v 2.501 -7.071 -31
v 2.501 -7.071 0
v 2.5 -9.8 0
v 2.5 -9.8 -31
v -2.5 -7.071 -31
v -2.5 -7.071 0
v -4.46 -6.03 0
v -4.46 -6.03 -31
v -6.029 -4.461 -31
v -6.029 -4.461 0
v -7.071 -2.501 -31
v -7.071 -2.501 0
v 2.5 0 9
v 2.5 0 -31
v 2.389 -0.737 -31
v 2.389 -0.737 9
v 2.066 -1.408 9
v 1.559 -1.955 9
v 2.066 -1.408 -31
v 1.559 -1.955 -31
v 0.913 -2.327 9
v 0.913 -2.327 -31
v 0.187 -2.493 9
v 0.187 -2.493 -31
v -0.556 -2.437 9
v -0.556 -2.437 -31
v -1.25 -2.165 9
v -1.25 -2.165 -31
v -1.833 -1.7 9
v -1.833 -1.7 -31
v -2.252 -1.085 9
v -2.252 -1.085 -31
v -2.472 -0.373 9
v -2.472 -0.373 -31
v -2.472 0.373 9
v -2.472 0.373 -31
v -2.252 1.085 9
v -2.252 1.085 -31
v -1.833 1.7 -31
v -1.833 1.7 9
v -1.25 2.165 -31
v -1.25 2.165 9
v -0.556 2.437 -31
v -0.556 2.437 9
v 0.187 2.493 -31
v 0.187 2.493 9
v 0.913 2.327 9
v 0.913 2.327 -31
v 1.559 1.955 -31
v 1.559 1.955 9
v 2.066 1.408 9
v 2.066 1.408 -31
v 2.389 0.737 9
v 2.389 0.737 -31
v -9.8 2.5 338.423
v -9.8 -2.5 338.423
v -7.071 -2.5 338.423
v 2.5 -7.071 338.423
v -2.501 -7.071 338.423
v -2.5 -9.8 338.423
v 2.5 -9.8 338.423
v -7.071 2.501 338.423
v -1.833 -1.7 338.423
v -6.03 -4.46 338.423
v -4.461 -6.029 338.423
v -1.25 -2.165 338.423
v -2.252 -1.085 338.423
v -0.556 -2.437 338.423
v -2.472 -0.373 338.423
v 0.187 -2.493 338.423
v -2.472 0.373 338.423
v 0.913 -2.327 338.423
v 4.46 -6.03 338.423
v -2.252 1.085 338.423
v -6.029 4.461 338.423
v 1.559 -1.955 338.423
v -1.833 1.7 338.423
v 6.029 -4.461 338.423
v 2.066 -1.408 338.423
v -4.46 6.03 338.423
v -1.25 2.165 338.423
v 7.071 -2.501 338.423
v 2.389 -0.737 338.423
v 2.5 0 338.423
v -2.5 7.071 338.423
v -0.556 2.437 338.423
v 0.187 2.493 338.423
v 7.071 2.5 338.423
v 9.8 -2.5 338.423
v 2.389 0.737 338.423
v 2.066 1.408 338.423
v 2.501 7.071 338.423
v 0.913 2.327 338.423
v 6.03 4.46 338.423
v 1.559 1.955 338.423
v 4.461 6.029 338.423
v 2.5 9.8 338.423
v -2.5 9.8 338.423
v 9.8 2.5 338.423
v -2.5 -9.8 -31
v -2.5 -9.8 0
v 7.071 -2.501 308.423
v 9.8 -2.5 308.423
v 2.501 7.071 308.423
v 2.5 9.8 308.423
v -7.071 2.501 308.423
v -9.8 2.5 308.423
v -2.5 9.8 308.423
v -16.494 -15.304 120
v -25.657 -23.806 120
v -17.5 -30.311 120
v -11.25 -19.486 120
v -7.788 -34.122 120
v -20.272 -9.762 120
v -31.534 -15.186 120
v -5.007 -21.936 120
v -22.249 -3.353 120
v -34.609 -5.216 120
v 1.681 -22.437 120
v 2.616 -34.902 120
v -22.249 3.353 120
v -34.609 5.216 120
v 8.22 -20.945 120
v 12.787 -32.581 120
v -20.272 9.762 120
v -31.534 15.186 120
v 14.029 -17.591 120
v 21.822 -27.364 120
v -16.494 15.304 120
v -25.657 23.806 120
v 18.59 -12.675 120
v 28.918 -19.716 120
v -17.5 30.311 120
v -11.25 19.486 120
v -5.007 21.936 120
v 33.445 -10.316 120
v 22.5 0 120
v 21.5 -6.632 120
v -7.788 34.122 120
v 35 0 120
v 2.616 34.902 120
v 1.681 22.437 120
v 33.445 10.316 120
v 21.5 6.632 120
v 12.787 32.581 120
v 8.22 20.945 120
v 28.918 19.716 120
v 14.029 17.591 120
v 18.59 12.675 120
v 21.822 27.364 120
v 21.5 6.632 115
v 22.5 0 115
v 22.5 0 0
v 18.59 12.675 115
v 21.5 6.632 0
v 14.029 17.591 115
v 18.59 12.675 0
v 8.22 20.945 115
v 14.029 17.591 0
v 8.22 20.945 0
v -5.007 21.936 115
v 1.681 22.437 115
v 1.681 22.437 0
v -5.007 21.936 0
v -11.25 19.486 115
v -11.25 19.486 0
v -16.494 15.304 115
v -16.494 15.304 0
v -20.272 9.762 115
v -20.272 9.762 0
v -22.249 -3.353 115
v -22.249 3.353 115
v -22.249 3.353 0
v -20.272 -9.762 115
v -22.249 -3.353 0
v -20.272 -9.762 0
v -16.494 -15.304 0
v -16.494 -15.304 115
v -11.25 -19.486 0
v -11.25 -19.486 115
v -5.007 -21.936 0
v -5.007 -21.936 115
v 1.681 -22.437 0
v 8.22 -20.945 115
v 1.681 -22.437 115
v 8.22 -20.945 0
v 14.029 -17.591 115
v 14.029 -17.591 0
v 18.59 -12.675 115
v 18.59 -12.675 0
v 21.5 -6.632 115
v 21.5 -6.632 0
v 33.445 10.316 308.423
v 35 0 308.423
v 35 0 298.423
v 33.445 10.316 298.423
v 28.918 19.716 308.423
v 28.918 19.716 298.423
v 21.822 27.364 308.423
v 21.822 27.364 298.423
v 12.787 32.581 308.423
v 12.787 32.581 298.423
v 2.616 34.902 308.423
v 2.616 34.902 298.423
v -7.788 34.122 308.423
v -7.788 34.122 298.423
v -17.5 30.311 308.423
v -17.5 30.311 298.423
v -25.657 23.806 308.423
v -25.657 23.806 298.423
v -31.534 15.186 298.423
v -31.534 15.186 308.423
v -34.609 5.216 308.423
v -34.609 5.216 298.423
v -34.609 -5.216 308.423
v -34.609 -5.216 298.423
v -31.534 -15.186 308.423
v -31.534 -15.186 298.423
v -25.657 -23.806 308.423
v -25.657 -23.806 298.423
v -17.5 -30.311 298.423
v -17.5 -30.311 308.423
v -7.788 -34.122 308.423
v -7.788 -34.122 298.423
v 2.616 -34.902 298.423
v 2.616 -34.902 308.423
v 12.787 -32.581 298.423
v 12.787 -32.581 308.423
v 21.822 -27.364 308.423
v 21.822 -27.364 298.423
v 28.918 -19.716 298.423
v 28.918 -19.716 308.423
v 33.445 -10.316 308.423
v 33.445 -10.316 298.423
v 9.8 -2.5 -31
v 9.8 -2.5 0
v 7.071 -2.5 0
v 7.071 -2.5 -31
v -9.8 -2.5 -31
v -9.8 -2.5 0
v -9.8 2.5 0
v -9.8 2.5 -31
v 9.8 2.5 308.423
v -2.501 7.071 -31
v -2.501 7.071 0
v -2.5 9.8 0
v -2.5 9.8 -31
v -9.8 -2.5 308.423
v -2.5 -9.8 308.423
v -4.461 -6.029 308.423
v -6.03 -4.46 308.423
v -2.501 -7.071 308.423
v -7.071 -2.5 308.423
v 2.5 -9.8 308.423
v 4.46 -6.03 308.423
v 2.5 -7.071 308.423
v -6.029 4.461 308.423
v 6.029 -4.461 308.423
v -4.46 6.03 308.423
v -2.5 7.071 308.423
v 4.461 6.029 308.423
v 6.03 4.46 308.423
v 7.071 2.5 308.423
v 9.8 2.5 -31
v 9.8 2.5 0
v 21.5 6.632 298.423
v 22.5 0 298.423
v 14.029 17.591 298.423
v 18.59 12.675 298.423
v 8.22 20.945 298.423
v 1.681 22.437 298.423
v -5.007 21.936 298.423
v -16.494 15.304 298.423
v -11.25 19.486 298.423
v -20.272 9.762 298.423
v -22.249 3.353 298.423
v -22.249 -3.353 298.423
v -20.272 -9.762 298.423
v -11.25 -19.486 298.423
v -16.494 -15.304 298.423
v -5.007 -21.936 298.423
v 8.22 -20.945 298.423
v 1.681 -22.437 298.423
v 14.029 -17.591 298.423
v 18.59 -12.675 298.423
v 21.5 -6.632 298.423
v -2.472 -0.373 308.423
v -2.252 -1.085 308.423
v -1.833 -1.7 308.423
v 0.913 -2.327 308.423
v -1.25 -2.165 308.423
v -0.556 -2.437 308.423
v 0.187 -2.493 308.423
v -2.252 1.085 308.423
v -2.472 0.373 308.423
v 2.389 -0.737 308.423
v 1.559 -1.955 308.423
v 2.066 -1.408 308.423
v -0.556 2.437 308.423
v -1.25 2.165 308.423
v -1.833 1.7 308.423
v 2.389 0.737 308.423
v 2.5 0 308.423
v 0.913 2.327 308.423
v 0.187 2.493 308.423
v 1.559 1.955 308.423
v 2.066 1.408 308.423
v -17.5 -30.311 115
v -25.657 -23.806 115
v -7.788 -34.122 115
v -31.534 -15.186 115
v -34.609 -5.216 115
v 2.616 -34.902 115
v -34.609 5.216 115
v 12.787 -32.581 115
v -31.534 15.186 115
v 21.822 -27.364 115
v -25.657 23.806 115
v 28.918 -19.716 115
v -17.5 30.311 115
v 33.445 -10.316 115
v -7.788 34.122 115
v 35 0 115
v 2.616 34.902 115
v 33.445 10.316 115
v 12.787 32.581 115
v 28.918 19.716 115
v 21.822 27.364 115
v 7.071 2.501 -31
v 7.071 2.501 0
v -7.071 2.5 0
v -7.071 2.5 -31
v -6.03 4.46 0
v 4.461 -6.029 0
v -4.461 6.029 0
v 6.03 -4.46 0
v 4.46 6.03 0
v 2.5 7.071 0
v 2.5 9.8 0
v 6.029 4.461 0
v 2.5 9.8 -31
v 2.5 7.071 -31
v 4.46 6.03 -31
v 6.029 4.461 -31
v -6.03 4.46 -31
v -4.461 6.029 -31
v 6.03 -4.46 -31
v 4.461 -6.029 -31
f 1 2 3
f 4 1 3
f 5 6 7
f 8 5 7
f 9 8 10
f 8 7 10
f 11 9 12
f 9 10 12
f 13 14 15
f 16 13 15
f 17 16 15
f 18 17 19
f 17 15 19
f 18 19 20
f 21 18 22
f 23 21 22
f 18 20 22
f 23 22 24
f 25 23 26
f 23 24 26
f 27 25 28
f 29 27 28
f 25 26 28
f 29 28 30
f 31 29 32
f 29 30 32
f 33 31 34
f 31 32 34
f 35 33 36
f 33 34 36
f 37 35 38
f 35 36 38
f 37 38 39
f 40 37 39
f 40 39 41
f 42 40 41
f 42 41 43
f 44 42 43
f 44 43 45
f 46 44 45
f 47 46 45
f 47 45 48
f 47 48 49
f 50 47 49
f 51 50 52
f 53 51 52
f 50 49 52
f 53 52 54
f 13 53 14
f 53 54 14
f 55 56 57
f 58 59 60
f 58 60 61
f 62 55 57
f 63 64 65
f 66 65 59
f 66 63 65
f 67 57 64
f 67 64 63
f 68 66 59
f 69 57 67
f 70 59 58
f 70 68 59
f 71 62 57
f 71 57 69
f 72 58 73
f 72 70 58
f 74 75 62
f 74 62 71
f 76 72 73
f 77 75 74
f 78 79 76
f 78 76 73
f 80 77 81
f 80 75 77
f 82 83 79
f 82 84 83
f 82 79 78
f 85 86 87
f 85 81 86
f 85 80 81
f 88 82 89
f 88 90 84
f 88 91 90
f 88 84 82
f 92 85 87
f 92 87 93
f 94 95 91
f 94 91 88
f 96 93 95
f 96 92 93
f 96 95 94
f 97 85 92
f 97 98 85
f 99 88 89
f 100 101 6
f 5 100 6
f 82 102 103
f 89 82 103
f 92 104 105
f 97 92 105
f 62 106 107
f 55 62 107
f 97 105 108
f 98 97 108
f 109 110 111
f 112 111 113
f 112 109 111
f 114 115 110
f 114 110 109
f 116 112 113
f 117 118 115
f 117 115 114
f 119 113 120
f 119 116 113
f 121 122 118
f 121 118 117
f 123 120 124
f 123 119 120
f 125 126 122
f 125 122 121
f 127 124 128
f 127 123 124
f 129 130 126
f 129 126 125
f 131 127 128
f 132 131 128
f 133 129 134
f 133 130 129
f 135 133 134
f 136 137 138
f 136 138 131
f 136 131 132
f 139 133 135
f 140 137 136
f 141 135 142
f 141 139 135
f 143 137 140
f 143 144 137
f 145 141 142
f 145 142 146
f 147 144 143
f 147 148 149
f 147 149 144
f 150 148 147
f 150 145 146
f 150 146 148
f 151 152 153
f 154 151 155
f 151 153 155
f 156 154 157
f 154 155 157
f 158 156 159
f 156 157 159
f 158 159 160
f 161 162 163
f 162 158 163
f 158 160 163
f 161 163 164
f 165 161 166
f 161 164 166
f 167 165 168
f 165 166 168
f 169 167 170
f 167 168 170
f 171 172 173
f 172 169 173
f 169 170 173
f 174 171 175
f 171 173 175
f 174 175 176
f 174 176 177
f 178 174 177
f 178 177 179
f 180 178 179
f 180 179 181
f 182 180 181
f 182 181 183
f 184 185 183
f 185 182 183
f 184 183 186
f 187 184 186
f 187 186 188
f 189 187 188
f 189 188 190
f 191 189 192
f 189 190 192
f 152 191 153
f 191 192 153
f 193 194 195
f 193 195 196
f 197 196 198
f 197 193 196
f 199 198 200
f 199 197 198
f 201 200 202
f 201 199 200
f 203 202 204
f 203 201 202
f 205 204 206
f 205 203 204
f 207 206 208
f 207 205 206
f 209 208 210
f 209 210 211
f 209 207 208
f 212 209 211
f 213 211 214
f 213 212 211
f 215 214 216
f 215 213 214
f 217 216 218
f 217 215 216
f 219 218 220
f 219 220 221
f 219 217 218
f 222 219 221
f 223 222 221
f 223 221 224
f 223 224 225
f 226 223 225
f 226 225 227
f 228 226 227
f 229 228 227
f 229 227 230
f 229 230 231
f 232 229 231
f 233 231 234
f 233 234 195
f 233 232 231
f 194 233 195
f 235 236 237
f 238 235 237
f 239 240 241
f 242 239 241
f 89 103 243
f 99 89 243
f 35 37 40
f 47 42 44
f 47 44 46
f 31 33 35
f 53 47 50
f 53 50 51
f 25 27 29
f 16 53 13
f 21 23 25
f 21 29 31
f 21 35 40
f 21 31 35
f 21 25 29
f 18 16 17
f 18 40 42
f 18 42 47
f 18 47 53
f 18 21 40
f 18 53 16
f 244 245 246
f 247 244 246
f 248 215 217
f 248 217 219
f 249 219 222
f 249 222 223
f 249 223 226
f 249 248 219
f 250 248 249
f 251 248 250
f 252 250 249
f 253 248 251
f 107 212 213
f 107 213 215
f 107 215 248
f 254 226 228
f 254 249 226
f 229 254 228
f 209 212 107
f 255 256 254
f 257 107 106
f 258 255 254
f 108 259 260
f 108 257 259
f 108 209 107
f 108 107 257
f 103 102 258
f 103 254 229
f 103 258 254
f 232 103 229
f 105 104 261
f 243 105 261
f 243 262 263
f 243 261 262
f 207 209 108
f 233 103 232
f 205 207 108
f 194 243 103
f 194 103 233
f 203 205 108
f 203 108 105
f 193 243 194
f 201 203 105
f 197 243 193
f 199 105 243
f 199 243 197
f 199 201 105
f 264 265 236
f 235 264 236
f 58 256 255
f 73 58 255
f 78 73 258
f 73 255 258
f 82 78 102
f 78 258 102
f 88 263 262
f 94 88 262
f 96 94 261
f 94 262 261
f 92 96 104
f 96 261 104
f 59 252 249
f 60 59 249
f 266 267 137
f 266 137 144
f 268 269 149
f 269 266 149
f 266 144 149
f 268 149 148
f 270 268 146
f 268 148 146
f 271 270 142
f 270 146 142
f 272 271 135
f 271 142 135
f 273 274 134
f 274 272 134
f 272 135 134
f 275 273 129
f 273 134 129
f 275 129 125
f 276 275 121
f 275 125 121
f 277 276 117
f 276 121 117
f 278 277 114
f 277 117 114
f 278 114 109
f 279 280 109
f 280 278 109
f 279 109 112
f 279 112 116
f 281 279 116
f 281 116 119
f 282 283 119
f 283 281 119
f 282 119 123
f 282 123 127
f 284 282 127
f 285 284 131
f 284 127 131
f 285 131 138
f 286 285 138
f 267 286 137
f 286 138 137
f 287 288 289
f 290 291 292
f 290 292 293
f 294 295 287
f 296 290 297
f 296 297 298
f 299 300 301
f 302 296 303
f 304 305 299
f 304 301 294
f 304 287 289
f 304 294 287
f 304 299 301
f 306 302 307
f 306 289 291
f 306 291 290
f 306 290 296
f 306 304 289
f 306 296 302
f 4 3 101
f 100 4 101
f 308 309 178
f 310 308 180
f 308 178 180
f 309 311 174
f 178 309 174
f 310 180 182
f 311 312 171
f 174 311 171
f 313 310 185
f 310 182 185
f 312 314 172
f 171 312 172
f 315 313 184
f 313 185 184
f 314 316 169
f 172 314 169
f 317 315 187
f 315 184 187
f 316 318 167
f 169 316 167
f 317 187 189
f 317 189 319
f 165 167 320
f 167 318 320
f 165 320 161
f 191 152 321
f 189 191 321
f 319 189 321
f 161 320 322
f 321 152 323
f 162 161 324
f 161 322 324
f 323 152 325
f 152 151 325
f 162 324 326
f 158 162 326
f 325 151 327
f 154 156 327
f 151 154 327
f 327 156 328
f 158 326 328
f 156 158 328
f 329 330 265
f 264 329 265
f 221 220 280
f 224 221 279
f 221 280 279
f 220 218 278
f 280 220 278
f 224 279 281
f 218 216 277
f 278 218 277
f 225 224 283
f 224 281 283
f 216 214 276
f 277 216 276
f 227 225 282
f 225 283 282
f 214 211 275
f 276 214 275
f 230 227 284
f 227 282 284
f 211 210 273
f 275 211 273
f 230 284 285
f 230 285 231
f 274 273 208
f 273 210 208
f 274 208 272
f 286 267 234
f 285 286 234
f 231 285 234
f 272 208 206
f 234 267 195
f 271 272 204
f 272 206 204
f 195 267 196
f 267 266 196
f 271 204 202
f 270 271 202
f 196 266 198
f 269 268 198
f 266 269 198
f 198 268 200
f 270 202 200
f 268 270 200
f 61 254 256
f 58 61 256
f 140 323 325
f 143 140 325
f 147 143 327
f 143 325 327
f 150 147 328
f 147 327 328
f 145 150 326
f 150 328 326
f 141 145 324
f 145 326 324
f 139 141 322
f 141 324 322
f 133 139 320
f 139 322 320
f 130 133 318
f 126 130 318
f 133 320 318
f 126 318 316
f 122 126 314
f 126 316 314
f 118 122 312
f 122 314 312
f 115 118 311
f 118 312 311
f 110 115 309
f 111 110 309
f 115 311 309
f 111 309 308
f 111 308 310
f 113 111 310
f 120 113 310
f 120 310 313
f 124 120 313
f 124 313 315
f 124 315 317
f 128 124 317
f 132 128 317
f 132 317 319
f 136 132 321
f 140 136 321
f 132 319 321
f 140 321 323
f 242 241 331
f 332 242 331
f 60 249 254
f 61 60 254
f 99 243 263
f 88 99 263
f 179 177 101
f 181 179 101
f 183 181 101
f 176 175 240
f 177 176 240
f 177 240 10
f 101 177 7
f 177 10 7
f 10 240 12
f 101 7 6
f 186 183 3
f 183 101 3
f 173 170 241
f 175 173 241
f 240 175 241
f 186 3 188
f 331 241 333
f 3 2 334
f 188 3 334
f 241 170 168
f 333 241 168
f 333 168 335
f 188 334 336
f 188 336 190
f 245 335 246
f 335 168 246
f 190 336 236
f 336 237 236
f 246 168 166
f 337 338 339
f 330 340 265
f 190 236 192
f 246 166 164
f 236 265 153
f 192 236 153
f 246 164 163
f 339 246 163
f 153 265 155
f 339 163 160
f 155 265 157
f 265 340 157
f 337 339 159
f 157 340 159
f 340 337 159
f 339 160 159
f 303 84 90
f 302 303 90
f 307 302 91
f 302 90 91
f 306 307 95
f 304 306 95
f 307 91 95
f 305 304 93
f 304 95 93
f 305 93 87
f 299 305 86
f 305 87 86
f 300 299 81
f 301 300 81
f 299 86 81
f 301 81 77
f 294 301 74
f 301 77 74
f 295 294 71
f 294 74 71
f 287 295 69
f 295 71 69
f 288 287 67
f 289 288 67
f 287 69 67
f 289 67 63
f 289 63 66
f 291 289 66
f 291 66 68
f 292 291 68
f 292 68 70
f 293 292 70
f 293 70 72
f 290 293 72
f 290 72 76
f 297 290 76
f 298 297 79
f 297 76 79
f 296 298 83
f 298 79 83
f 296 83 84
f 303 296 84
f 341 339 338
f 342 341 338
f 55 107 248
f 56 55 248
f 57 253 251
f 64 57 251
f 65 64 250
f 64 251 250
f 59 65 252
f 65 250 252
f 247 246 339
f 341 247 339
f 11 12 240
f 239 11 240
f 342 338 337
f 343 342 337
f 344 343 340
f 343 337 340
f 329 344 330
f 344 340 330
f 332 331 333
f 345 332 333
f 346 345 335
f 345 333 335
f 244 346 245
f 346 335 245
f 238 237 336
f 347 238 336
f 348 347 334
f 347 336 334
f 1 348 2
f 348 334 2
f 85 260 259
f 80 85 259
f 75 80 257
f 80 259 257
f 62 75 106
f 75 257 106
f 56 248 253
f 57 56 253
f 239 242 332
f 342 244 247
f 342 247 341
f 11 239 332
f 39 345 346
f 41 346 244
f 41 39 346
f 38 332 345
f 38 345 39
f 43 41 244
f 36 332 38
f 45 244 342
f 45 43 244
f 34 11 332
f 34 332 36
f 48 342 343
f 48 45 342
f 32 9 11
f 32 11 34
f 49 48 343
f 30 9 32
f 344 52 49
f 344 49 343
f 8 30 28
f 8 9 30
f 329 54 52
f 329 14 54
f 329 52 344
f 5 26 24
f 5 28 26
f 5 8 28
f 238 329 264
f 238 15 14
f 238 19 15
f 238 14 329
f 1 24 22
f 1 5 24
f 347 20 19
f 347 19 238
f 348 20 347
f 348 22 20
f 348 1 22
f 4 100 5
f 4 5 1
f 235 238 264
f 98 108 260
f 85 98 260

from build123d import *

# Parameters (mm, degrees)
F0_R      = 22.5
F1_DEPTH  = 308.423
F4_DEPTH  = 31
F5_R      = 2.5
F6_DEPTH  = 40
F7_DEPTH  = 30
F8_R      = 2.5
F9_DEPTH  = 30
F10_R     = 35
F11_DEPTH = 10
F13_R     = 35
F14_DEPTH = 5


with BuildPart() as f1:
    # F0 (on Top) → F1 (new body)
    with BuildSketch(Plane.XY):
        Circle(F0_R)
    extrude(amount=F1_DEPTH)

    # F3 (on face) → F4 (join)
    with BuildSketch(Plane(origin=(0, 0, 0), x_dir=(1, 0, 0), z_dir=(0, 0, -1))):
        with BuildLine():
            ThreePointArc((7.0710678119, 2.5), (7.3919891974, 1.2682648404), (7.5, 0))
            ThreePointArc((7.5, 0), (7.3919069765, -1.268743966), (7.0707436663, -2.500916633))
            Line((7.0707436663, -2.500916633), (9.7997435124, -2.5))
            Line((9.7997435124, -2.5), (9.7997435124, 0))
            Line((9.7997435124, 0), (9.7997435124, 2.5))
            Line((9.7997435124, 2.5), (7.0710678119, 2.5))
        make_face()
        with BuildLine():
            Line((2.5, -9.7997435124), (2.5, -7.0710678119))
            ThreePointArc((2.5, -7.0710678119), (-0.0004861292, -7.4999999842), (-2.500916633, -7.0707436663))
            Line((-2.500916633, -7.0707436663), (-2.5, -9.7997435124))
            Line((-2.5, -9.7997435124), (0, -9.7997435124))
            Line((0, -9.7997435124), (2.5, -9.7997435124))
        make_face()
        with BuildLine():
            ThreePointArc((-7.0710678119, -2.5), (-7.4999999842, 0.0004861292), (-7.0707436663, 2.500916633))
            Line((-7.0707436663, 2.500916633), (-9.7997435124, 2.5))
            Line((-9.7997435124, 2.5), (-9.7997435124, 0))
            Line((-9.7997435124, 0), (-9.7997435124, -2.5))
            Line((-9.7997435124, -2.5), (-7.0710678119, -2.5))
        make_face()
        with BuildLine():
            ThreePointArc((7.0707436663, -2.500916633), (7.3919069765, -1.268743966), (7.5, 0))
            ThreePointArc((7.5, 0), (7.3919891974, 1.2682648404), (7.0710678119, 2.5))
            ThreePointArc((7.0710678119, 2.5), (5.303644593, 5.3029571025), (2.500916633, 7.0707436663))
            ThreePointArc((2.500916633, 7.0707436663), (0.0004861292, 7.4999999842), (-2.5, 7.0710678119))
            ThreePointArc((-2.5, 7.0710678119), (-5.3029571025, 5.303644593), (-7.0707436663, 2.500916633))
            ThreePointArc((-7.0707436663, 2.500916633), (-7.4999999842, 0.0004861292), (-7.0710678119, -2.5))
            ThreePointArc((-7.0710678119, -2.5), (-5.303644593, -5.3029571025), (-2.500916633, -7.0707436663))
            ThreePointArc((-2.500916633, -7.0707436663), (-0.0004861292, -7.4999999842), (2.5, -7.0710678119))
            ThreePointArc((2.5, -7.0710678119), (5.3029571025, -5.303644593), (7.0707436663, -2.500916633))
        make_face()
        with BuildLine():
            ThreePointArc((-2.5, 7.0710678119), (0.0004861292, 7.4999999842), (2.500916633, 7.0707436663))
            Line((2.500916633, 7.0707436663), (2.5, 9.7997435124))
            Line((2.5, 9.7997435124), (0, 9.7997435124))
            Line((0, 9.7997435124), (-2.5, 9.7997435124))
            Line((-2.5, 9.7997435124), (-2.5, 7.0710678119))
        make_face()
    extrude(amount=F4_DEPTH)

    # F5 (on face) → F6 (cut)
    with BuildSketch(Plane(origin=(0, 0, -31), x_dir=(1, 0, 0), z_dir=(0, 0, -1))):
        Circle(F5_R)
    extrude(amount=-F6_DEPTH, mode=Mode.SUBTRACT)

    # F2 (on face) → F7 (join)
    with BuildSketch(Plane.XY.offset(308.423)):
        with BuildLine():
            ThreePointArc((7.0707436663, -2.500916633), (7.3919069765, -1.268743966), (7.5, 0))
            ThreePointArc((7.5, 0), (7.3919891974, 1.2682648404), (7.0710678119, 2.5))
            ThreePointArc((7.0710678119, 2.5), (5.303644593, 5.3029571025), (2.500916633, 7.0707436663))
            ThreePointArc((2.500916633, 7.0707436663), (0.0004861292, 7.4999999842), (-2.5, 7.0710678119))
            ThreePointArc((-2.5, 7.0710678119), (-5.3029571025, 5.303644593), (-7.0707436663, 2.500916633))
            ThreePointArc((-7.0707436663, 2.500916633), (-7.4999999842, 0.0004861292), (-7.0710678119, -2.5))
            ThreePointArc((-7.0710678119, -2.5), (-5.303644593, -5.3029571025), (-2.500916633, -7.0707436663))
            ThreePointArc((-2.500916633, -7.0707436663), (-0.0004861292, -7.4999999842), (2.5, -7.0710678119))
            ThreePointArc((2.5, -7.0710678119), (5.3029571025, -5.303644593), (7.0707436663, -2.500916633))
        make_face()
        with BuildLine():
            ThreePointArc((-7.0710678119, -2.5), (-7.4999999842, 0.0004861292), (-7.0707436663, 2.500916633))
            Line((-7.0707436663, 2.500916633), (-9.7997435124, 2.5))
            Line((-9.7997435124, 2.5), (-9.7997435124, 0))
            Line((-9.7997435124, 0), (-9.7997435124, -2.5))
            Line((-9.7997435124, -2.5), (-7.0710678119, -2.5))
        make_face()
        with BuildLine():
            ThreePointArc((-2.5, 7.0710678119), (0.0004861292, 7.4999999842), (2.500916633, 7.0707436663))
            Line((2.500916633, 7.0707436663), (2.5, 9.7997435124))
            Line((2.5, 9.7997435124), (0, 9.7997435124))
            Line((0, 9.7997435124), (-2.5, 9.7997435124))
            Line((-2.5, 9.7997435124), (-2.5, 7.0710678119))
        make_face()
        with BuildLine():
            ThreePointArc((7.0710678119, 2.5), (7.3919891974, 1.2682648404), (7.5, 0))
            ThreePointArc((7.5, 0), (7.3919069765, -1.268743966), (7.0707436663, -2.500916633))
            Line((7.0707436663, -2.500916633), (9.7997435124, -2.5))
            Line((9.7997435124, -2.5), (9.7997435124, 0))
            Line((9.7997435124, 0), (9.7997435124, 2.5))
            Line((9.7997435124, 2.5), (7.0710678119, 2.5))
        make_face()
        with BuildLine():
            Line((2.5, -9.7997435124), (2.5, -7.0710678119))
            ThreePointArc((2.5, -7.0710678119), (-0.0004861292, -7.4999999842), (-2.500916633, -7.0707436663))
            Line((-2.500916633, -7.0707436663), (-2.5, -9.7997435124))
            Line((-2.5, -9.7997435124), (0, -9.7997435124))
            Line((0, -9.7997435124), (2.5, -9.7997435124))
        make_face()
    extrude(amount=F7_DEPTH)

    # F8 (on face) → F9 (cut)
    with BuildSketch(Plane.XY.offset(338.423)):
        Circle(F8_R)
    extrude(amount=-F9_DEPTH, mode=Mode.SUBTRACT)

    # F10 (on face) → F11 (join)
    with BuildSketch(Plane.XY.offset(308.423)):
        Circle(F10_R)
    extrude(amount=-F11_DEPTH)

    # F13 (on offset) → F14 (join)
    with BuildSketch(Plane.XY.offset(115)):
        Circle(F13_R)
    extrude(amount=F14_DEPTH)


solid = f1.part
